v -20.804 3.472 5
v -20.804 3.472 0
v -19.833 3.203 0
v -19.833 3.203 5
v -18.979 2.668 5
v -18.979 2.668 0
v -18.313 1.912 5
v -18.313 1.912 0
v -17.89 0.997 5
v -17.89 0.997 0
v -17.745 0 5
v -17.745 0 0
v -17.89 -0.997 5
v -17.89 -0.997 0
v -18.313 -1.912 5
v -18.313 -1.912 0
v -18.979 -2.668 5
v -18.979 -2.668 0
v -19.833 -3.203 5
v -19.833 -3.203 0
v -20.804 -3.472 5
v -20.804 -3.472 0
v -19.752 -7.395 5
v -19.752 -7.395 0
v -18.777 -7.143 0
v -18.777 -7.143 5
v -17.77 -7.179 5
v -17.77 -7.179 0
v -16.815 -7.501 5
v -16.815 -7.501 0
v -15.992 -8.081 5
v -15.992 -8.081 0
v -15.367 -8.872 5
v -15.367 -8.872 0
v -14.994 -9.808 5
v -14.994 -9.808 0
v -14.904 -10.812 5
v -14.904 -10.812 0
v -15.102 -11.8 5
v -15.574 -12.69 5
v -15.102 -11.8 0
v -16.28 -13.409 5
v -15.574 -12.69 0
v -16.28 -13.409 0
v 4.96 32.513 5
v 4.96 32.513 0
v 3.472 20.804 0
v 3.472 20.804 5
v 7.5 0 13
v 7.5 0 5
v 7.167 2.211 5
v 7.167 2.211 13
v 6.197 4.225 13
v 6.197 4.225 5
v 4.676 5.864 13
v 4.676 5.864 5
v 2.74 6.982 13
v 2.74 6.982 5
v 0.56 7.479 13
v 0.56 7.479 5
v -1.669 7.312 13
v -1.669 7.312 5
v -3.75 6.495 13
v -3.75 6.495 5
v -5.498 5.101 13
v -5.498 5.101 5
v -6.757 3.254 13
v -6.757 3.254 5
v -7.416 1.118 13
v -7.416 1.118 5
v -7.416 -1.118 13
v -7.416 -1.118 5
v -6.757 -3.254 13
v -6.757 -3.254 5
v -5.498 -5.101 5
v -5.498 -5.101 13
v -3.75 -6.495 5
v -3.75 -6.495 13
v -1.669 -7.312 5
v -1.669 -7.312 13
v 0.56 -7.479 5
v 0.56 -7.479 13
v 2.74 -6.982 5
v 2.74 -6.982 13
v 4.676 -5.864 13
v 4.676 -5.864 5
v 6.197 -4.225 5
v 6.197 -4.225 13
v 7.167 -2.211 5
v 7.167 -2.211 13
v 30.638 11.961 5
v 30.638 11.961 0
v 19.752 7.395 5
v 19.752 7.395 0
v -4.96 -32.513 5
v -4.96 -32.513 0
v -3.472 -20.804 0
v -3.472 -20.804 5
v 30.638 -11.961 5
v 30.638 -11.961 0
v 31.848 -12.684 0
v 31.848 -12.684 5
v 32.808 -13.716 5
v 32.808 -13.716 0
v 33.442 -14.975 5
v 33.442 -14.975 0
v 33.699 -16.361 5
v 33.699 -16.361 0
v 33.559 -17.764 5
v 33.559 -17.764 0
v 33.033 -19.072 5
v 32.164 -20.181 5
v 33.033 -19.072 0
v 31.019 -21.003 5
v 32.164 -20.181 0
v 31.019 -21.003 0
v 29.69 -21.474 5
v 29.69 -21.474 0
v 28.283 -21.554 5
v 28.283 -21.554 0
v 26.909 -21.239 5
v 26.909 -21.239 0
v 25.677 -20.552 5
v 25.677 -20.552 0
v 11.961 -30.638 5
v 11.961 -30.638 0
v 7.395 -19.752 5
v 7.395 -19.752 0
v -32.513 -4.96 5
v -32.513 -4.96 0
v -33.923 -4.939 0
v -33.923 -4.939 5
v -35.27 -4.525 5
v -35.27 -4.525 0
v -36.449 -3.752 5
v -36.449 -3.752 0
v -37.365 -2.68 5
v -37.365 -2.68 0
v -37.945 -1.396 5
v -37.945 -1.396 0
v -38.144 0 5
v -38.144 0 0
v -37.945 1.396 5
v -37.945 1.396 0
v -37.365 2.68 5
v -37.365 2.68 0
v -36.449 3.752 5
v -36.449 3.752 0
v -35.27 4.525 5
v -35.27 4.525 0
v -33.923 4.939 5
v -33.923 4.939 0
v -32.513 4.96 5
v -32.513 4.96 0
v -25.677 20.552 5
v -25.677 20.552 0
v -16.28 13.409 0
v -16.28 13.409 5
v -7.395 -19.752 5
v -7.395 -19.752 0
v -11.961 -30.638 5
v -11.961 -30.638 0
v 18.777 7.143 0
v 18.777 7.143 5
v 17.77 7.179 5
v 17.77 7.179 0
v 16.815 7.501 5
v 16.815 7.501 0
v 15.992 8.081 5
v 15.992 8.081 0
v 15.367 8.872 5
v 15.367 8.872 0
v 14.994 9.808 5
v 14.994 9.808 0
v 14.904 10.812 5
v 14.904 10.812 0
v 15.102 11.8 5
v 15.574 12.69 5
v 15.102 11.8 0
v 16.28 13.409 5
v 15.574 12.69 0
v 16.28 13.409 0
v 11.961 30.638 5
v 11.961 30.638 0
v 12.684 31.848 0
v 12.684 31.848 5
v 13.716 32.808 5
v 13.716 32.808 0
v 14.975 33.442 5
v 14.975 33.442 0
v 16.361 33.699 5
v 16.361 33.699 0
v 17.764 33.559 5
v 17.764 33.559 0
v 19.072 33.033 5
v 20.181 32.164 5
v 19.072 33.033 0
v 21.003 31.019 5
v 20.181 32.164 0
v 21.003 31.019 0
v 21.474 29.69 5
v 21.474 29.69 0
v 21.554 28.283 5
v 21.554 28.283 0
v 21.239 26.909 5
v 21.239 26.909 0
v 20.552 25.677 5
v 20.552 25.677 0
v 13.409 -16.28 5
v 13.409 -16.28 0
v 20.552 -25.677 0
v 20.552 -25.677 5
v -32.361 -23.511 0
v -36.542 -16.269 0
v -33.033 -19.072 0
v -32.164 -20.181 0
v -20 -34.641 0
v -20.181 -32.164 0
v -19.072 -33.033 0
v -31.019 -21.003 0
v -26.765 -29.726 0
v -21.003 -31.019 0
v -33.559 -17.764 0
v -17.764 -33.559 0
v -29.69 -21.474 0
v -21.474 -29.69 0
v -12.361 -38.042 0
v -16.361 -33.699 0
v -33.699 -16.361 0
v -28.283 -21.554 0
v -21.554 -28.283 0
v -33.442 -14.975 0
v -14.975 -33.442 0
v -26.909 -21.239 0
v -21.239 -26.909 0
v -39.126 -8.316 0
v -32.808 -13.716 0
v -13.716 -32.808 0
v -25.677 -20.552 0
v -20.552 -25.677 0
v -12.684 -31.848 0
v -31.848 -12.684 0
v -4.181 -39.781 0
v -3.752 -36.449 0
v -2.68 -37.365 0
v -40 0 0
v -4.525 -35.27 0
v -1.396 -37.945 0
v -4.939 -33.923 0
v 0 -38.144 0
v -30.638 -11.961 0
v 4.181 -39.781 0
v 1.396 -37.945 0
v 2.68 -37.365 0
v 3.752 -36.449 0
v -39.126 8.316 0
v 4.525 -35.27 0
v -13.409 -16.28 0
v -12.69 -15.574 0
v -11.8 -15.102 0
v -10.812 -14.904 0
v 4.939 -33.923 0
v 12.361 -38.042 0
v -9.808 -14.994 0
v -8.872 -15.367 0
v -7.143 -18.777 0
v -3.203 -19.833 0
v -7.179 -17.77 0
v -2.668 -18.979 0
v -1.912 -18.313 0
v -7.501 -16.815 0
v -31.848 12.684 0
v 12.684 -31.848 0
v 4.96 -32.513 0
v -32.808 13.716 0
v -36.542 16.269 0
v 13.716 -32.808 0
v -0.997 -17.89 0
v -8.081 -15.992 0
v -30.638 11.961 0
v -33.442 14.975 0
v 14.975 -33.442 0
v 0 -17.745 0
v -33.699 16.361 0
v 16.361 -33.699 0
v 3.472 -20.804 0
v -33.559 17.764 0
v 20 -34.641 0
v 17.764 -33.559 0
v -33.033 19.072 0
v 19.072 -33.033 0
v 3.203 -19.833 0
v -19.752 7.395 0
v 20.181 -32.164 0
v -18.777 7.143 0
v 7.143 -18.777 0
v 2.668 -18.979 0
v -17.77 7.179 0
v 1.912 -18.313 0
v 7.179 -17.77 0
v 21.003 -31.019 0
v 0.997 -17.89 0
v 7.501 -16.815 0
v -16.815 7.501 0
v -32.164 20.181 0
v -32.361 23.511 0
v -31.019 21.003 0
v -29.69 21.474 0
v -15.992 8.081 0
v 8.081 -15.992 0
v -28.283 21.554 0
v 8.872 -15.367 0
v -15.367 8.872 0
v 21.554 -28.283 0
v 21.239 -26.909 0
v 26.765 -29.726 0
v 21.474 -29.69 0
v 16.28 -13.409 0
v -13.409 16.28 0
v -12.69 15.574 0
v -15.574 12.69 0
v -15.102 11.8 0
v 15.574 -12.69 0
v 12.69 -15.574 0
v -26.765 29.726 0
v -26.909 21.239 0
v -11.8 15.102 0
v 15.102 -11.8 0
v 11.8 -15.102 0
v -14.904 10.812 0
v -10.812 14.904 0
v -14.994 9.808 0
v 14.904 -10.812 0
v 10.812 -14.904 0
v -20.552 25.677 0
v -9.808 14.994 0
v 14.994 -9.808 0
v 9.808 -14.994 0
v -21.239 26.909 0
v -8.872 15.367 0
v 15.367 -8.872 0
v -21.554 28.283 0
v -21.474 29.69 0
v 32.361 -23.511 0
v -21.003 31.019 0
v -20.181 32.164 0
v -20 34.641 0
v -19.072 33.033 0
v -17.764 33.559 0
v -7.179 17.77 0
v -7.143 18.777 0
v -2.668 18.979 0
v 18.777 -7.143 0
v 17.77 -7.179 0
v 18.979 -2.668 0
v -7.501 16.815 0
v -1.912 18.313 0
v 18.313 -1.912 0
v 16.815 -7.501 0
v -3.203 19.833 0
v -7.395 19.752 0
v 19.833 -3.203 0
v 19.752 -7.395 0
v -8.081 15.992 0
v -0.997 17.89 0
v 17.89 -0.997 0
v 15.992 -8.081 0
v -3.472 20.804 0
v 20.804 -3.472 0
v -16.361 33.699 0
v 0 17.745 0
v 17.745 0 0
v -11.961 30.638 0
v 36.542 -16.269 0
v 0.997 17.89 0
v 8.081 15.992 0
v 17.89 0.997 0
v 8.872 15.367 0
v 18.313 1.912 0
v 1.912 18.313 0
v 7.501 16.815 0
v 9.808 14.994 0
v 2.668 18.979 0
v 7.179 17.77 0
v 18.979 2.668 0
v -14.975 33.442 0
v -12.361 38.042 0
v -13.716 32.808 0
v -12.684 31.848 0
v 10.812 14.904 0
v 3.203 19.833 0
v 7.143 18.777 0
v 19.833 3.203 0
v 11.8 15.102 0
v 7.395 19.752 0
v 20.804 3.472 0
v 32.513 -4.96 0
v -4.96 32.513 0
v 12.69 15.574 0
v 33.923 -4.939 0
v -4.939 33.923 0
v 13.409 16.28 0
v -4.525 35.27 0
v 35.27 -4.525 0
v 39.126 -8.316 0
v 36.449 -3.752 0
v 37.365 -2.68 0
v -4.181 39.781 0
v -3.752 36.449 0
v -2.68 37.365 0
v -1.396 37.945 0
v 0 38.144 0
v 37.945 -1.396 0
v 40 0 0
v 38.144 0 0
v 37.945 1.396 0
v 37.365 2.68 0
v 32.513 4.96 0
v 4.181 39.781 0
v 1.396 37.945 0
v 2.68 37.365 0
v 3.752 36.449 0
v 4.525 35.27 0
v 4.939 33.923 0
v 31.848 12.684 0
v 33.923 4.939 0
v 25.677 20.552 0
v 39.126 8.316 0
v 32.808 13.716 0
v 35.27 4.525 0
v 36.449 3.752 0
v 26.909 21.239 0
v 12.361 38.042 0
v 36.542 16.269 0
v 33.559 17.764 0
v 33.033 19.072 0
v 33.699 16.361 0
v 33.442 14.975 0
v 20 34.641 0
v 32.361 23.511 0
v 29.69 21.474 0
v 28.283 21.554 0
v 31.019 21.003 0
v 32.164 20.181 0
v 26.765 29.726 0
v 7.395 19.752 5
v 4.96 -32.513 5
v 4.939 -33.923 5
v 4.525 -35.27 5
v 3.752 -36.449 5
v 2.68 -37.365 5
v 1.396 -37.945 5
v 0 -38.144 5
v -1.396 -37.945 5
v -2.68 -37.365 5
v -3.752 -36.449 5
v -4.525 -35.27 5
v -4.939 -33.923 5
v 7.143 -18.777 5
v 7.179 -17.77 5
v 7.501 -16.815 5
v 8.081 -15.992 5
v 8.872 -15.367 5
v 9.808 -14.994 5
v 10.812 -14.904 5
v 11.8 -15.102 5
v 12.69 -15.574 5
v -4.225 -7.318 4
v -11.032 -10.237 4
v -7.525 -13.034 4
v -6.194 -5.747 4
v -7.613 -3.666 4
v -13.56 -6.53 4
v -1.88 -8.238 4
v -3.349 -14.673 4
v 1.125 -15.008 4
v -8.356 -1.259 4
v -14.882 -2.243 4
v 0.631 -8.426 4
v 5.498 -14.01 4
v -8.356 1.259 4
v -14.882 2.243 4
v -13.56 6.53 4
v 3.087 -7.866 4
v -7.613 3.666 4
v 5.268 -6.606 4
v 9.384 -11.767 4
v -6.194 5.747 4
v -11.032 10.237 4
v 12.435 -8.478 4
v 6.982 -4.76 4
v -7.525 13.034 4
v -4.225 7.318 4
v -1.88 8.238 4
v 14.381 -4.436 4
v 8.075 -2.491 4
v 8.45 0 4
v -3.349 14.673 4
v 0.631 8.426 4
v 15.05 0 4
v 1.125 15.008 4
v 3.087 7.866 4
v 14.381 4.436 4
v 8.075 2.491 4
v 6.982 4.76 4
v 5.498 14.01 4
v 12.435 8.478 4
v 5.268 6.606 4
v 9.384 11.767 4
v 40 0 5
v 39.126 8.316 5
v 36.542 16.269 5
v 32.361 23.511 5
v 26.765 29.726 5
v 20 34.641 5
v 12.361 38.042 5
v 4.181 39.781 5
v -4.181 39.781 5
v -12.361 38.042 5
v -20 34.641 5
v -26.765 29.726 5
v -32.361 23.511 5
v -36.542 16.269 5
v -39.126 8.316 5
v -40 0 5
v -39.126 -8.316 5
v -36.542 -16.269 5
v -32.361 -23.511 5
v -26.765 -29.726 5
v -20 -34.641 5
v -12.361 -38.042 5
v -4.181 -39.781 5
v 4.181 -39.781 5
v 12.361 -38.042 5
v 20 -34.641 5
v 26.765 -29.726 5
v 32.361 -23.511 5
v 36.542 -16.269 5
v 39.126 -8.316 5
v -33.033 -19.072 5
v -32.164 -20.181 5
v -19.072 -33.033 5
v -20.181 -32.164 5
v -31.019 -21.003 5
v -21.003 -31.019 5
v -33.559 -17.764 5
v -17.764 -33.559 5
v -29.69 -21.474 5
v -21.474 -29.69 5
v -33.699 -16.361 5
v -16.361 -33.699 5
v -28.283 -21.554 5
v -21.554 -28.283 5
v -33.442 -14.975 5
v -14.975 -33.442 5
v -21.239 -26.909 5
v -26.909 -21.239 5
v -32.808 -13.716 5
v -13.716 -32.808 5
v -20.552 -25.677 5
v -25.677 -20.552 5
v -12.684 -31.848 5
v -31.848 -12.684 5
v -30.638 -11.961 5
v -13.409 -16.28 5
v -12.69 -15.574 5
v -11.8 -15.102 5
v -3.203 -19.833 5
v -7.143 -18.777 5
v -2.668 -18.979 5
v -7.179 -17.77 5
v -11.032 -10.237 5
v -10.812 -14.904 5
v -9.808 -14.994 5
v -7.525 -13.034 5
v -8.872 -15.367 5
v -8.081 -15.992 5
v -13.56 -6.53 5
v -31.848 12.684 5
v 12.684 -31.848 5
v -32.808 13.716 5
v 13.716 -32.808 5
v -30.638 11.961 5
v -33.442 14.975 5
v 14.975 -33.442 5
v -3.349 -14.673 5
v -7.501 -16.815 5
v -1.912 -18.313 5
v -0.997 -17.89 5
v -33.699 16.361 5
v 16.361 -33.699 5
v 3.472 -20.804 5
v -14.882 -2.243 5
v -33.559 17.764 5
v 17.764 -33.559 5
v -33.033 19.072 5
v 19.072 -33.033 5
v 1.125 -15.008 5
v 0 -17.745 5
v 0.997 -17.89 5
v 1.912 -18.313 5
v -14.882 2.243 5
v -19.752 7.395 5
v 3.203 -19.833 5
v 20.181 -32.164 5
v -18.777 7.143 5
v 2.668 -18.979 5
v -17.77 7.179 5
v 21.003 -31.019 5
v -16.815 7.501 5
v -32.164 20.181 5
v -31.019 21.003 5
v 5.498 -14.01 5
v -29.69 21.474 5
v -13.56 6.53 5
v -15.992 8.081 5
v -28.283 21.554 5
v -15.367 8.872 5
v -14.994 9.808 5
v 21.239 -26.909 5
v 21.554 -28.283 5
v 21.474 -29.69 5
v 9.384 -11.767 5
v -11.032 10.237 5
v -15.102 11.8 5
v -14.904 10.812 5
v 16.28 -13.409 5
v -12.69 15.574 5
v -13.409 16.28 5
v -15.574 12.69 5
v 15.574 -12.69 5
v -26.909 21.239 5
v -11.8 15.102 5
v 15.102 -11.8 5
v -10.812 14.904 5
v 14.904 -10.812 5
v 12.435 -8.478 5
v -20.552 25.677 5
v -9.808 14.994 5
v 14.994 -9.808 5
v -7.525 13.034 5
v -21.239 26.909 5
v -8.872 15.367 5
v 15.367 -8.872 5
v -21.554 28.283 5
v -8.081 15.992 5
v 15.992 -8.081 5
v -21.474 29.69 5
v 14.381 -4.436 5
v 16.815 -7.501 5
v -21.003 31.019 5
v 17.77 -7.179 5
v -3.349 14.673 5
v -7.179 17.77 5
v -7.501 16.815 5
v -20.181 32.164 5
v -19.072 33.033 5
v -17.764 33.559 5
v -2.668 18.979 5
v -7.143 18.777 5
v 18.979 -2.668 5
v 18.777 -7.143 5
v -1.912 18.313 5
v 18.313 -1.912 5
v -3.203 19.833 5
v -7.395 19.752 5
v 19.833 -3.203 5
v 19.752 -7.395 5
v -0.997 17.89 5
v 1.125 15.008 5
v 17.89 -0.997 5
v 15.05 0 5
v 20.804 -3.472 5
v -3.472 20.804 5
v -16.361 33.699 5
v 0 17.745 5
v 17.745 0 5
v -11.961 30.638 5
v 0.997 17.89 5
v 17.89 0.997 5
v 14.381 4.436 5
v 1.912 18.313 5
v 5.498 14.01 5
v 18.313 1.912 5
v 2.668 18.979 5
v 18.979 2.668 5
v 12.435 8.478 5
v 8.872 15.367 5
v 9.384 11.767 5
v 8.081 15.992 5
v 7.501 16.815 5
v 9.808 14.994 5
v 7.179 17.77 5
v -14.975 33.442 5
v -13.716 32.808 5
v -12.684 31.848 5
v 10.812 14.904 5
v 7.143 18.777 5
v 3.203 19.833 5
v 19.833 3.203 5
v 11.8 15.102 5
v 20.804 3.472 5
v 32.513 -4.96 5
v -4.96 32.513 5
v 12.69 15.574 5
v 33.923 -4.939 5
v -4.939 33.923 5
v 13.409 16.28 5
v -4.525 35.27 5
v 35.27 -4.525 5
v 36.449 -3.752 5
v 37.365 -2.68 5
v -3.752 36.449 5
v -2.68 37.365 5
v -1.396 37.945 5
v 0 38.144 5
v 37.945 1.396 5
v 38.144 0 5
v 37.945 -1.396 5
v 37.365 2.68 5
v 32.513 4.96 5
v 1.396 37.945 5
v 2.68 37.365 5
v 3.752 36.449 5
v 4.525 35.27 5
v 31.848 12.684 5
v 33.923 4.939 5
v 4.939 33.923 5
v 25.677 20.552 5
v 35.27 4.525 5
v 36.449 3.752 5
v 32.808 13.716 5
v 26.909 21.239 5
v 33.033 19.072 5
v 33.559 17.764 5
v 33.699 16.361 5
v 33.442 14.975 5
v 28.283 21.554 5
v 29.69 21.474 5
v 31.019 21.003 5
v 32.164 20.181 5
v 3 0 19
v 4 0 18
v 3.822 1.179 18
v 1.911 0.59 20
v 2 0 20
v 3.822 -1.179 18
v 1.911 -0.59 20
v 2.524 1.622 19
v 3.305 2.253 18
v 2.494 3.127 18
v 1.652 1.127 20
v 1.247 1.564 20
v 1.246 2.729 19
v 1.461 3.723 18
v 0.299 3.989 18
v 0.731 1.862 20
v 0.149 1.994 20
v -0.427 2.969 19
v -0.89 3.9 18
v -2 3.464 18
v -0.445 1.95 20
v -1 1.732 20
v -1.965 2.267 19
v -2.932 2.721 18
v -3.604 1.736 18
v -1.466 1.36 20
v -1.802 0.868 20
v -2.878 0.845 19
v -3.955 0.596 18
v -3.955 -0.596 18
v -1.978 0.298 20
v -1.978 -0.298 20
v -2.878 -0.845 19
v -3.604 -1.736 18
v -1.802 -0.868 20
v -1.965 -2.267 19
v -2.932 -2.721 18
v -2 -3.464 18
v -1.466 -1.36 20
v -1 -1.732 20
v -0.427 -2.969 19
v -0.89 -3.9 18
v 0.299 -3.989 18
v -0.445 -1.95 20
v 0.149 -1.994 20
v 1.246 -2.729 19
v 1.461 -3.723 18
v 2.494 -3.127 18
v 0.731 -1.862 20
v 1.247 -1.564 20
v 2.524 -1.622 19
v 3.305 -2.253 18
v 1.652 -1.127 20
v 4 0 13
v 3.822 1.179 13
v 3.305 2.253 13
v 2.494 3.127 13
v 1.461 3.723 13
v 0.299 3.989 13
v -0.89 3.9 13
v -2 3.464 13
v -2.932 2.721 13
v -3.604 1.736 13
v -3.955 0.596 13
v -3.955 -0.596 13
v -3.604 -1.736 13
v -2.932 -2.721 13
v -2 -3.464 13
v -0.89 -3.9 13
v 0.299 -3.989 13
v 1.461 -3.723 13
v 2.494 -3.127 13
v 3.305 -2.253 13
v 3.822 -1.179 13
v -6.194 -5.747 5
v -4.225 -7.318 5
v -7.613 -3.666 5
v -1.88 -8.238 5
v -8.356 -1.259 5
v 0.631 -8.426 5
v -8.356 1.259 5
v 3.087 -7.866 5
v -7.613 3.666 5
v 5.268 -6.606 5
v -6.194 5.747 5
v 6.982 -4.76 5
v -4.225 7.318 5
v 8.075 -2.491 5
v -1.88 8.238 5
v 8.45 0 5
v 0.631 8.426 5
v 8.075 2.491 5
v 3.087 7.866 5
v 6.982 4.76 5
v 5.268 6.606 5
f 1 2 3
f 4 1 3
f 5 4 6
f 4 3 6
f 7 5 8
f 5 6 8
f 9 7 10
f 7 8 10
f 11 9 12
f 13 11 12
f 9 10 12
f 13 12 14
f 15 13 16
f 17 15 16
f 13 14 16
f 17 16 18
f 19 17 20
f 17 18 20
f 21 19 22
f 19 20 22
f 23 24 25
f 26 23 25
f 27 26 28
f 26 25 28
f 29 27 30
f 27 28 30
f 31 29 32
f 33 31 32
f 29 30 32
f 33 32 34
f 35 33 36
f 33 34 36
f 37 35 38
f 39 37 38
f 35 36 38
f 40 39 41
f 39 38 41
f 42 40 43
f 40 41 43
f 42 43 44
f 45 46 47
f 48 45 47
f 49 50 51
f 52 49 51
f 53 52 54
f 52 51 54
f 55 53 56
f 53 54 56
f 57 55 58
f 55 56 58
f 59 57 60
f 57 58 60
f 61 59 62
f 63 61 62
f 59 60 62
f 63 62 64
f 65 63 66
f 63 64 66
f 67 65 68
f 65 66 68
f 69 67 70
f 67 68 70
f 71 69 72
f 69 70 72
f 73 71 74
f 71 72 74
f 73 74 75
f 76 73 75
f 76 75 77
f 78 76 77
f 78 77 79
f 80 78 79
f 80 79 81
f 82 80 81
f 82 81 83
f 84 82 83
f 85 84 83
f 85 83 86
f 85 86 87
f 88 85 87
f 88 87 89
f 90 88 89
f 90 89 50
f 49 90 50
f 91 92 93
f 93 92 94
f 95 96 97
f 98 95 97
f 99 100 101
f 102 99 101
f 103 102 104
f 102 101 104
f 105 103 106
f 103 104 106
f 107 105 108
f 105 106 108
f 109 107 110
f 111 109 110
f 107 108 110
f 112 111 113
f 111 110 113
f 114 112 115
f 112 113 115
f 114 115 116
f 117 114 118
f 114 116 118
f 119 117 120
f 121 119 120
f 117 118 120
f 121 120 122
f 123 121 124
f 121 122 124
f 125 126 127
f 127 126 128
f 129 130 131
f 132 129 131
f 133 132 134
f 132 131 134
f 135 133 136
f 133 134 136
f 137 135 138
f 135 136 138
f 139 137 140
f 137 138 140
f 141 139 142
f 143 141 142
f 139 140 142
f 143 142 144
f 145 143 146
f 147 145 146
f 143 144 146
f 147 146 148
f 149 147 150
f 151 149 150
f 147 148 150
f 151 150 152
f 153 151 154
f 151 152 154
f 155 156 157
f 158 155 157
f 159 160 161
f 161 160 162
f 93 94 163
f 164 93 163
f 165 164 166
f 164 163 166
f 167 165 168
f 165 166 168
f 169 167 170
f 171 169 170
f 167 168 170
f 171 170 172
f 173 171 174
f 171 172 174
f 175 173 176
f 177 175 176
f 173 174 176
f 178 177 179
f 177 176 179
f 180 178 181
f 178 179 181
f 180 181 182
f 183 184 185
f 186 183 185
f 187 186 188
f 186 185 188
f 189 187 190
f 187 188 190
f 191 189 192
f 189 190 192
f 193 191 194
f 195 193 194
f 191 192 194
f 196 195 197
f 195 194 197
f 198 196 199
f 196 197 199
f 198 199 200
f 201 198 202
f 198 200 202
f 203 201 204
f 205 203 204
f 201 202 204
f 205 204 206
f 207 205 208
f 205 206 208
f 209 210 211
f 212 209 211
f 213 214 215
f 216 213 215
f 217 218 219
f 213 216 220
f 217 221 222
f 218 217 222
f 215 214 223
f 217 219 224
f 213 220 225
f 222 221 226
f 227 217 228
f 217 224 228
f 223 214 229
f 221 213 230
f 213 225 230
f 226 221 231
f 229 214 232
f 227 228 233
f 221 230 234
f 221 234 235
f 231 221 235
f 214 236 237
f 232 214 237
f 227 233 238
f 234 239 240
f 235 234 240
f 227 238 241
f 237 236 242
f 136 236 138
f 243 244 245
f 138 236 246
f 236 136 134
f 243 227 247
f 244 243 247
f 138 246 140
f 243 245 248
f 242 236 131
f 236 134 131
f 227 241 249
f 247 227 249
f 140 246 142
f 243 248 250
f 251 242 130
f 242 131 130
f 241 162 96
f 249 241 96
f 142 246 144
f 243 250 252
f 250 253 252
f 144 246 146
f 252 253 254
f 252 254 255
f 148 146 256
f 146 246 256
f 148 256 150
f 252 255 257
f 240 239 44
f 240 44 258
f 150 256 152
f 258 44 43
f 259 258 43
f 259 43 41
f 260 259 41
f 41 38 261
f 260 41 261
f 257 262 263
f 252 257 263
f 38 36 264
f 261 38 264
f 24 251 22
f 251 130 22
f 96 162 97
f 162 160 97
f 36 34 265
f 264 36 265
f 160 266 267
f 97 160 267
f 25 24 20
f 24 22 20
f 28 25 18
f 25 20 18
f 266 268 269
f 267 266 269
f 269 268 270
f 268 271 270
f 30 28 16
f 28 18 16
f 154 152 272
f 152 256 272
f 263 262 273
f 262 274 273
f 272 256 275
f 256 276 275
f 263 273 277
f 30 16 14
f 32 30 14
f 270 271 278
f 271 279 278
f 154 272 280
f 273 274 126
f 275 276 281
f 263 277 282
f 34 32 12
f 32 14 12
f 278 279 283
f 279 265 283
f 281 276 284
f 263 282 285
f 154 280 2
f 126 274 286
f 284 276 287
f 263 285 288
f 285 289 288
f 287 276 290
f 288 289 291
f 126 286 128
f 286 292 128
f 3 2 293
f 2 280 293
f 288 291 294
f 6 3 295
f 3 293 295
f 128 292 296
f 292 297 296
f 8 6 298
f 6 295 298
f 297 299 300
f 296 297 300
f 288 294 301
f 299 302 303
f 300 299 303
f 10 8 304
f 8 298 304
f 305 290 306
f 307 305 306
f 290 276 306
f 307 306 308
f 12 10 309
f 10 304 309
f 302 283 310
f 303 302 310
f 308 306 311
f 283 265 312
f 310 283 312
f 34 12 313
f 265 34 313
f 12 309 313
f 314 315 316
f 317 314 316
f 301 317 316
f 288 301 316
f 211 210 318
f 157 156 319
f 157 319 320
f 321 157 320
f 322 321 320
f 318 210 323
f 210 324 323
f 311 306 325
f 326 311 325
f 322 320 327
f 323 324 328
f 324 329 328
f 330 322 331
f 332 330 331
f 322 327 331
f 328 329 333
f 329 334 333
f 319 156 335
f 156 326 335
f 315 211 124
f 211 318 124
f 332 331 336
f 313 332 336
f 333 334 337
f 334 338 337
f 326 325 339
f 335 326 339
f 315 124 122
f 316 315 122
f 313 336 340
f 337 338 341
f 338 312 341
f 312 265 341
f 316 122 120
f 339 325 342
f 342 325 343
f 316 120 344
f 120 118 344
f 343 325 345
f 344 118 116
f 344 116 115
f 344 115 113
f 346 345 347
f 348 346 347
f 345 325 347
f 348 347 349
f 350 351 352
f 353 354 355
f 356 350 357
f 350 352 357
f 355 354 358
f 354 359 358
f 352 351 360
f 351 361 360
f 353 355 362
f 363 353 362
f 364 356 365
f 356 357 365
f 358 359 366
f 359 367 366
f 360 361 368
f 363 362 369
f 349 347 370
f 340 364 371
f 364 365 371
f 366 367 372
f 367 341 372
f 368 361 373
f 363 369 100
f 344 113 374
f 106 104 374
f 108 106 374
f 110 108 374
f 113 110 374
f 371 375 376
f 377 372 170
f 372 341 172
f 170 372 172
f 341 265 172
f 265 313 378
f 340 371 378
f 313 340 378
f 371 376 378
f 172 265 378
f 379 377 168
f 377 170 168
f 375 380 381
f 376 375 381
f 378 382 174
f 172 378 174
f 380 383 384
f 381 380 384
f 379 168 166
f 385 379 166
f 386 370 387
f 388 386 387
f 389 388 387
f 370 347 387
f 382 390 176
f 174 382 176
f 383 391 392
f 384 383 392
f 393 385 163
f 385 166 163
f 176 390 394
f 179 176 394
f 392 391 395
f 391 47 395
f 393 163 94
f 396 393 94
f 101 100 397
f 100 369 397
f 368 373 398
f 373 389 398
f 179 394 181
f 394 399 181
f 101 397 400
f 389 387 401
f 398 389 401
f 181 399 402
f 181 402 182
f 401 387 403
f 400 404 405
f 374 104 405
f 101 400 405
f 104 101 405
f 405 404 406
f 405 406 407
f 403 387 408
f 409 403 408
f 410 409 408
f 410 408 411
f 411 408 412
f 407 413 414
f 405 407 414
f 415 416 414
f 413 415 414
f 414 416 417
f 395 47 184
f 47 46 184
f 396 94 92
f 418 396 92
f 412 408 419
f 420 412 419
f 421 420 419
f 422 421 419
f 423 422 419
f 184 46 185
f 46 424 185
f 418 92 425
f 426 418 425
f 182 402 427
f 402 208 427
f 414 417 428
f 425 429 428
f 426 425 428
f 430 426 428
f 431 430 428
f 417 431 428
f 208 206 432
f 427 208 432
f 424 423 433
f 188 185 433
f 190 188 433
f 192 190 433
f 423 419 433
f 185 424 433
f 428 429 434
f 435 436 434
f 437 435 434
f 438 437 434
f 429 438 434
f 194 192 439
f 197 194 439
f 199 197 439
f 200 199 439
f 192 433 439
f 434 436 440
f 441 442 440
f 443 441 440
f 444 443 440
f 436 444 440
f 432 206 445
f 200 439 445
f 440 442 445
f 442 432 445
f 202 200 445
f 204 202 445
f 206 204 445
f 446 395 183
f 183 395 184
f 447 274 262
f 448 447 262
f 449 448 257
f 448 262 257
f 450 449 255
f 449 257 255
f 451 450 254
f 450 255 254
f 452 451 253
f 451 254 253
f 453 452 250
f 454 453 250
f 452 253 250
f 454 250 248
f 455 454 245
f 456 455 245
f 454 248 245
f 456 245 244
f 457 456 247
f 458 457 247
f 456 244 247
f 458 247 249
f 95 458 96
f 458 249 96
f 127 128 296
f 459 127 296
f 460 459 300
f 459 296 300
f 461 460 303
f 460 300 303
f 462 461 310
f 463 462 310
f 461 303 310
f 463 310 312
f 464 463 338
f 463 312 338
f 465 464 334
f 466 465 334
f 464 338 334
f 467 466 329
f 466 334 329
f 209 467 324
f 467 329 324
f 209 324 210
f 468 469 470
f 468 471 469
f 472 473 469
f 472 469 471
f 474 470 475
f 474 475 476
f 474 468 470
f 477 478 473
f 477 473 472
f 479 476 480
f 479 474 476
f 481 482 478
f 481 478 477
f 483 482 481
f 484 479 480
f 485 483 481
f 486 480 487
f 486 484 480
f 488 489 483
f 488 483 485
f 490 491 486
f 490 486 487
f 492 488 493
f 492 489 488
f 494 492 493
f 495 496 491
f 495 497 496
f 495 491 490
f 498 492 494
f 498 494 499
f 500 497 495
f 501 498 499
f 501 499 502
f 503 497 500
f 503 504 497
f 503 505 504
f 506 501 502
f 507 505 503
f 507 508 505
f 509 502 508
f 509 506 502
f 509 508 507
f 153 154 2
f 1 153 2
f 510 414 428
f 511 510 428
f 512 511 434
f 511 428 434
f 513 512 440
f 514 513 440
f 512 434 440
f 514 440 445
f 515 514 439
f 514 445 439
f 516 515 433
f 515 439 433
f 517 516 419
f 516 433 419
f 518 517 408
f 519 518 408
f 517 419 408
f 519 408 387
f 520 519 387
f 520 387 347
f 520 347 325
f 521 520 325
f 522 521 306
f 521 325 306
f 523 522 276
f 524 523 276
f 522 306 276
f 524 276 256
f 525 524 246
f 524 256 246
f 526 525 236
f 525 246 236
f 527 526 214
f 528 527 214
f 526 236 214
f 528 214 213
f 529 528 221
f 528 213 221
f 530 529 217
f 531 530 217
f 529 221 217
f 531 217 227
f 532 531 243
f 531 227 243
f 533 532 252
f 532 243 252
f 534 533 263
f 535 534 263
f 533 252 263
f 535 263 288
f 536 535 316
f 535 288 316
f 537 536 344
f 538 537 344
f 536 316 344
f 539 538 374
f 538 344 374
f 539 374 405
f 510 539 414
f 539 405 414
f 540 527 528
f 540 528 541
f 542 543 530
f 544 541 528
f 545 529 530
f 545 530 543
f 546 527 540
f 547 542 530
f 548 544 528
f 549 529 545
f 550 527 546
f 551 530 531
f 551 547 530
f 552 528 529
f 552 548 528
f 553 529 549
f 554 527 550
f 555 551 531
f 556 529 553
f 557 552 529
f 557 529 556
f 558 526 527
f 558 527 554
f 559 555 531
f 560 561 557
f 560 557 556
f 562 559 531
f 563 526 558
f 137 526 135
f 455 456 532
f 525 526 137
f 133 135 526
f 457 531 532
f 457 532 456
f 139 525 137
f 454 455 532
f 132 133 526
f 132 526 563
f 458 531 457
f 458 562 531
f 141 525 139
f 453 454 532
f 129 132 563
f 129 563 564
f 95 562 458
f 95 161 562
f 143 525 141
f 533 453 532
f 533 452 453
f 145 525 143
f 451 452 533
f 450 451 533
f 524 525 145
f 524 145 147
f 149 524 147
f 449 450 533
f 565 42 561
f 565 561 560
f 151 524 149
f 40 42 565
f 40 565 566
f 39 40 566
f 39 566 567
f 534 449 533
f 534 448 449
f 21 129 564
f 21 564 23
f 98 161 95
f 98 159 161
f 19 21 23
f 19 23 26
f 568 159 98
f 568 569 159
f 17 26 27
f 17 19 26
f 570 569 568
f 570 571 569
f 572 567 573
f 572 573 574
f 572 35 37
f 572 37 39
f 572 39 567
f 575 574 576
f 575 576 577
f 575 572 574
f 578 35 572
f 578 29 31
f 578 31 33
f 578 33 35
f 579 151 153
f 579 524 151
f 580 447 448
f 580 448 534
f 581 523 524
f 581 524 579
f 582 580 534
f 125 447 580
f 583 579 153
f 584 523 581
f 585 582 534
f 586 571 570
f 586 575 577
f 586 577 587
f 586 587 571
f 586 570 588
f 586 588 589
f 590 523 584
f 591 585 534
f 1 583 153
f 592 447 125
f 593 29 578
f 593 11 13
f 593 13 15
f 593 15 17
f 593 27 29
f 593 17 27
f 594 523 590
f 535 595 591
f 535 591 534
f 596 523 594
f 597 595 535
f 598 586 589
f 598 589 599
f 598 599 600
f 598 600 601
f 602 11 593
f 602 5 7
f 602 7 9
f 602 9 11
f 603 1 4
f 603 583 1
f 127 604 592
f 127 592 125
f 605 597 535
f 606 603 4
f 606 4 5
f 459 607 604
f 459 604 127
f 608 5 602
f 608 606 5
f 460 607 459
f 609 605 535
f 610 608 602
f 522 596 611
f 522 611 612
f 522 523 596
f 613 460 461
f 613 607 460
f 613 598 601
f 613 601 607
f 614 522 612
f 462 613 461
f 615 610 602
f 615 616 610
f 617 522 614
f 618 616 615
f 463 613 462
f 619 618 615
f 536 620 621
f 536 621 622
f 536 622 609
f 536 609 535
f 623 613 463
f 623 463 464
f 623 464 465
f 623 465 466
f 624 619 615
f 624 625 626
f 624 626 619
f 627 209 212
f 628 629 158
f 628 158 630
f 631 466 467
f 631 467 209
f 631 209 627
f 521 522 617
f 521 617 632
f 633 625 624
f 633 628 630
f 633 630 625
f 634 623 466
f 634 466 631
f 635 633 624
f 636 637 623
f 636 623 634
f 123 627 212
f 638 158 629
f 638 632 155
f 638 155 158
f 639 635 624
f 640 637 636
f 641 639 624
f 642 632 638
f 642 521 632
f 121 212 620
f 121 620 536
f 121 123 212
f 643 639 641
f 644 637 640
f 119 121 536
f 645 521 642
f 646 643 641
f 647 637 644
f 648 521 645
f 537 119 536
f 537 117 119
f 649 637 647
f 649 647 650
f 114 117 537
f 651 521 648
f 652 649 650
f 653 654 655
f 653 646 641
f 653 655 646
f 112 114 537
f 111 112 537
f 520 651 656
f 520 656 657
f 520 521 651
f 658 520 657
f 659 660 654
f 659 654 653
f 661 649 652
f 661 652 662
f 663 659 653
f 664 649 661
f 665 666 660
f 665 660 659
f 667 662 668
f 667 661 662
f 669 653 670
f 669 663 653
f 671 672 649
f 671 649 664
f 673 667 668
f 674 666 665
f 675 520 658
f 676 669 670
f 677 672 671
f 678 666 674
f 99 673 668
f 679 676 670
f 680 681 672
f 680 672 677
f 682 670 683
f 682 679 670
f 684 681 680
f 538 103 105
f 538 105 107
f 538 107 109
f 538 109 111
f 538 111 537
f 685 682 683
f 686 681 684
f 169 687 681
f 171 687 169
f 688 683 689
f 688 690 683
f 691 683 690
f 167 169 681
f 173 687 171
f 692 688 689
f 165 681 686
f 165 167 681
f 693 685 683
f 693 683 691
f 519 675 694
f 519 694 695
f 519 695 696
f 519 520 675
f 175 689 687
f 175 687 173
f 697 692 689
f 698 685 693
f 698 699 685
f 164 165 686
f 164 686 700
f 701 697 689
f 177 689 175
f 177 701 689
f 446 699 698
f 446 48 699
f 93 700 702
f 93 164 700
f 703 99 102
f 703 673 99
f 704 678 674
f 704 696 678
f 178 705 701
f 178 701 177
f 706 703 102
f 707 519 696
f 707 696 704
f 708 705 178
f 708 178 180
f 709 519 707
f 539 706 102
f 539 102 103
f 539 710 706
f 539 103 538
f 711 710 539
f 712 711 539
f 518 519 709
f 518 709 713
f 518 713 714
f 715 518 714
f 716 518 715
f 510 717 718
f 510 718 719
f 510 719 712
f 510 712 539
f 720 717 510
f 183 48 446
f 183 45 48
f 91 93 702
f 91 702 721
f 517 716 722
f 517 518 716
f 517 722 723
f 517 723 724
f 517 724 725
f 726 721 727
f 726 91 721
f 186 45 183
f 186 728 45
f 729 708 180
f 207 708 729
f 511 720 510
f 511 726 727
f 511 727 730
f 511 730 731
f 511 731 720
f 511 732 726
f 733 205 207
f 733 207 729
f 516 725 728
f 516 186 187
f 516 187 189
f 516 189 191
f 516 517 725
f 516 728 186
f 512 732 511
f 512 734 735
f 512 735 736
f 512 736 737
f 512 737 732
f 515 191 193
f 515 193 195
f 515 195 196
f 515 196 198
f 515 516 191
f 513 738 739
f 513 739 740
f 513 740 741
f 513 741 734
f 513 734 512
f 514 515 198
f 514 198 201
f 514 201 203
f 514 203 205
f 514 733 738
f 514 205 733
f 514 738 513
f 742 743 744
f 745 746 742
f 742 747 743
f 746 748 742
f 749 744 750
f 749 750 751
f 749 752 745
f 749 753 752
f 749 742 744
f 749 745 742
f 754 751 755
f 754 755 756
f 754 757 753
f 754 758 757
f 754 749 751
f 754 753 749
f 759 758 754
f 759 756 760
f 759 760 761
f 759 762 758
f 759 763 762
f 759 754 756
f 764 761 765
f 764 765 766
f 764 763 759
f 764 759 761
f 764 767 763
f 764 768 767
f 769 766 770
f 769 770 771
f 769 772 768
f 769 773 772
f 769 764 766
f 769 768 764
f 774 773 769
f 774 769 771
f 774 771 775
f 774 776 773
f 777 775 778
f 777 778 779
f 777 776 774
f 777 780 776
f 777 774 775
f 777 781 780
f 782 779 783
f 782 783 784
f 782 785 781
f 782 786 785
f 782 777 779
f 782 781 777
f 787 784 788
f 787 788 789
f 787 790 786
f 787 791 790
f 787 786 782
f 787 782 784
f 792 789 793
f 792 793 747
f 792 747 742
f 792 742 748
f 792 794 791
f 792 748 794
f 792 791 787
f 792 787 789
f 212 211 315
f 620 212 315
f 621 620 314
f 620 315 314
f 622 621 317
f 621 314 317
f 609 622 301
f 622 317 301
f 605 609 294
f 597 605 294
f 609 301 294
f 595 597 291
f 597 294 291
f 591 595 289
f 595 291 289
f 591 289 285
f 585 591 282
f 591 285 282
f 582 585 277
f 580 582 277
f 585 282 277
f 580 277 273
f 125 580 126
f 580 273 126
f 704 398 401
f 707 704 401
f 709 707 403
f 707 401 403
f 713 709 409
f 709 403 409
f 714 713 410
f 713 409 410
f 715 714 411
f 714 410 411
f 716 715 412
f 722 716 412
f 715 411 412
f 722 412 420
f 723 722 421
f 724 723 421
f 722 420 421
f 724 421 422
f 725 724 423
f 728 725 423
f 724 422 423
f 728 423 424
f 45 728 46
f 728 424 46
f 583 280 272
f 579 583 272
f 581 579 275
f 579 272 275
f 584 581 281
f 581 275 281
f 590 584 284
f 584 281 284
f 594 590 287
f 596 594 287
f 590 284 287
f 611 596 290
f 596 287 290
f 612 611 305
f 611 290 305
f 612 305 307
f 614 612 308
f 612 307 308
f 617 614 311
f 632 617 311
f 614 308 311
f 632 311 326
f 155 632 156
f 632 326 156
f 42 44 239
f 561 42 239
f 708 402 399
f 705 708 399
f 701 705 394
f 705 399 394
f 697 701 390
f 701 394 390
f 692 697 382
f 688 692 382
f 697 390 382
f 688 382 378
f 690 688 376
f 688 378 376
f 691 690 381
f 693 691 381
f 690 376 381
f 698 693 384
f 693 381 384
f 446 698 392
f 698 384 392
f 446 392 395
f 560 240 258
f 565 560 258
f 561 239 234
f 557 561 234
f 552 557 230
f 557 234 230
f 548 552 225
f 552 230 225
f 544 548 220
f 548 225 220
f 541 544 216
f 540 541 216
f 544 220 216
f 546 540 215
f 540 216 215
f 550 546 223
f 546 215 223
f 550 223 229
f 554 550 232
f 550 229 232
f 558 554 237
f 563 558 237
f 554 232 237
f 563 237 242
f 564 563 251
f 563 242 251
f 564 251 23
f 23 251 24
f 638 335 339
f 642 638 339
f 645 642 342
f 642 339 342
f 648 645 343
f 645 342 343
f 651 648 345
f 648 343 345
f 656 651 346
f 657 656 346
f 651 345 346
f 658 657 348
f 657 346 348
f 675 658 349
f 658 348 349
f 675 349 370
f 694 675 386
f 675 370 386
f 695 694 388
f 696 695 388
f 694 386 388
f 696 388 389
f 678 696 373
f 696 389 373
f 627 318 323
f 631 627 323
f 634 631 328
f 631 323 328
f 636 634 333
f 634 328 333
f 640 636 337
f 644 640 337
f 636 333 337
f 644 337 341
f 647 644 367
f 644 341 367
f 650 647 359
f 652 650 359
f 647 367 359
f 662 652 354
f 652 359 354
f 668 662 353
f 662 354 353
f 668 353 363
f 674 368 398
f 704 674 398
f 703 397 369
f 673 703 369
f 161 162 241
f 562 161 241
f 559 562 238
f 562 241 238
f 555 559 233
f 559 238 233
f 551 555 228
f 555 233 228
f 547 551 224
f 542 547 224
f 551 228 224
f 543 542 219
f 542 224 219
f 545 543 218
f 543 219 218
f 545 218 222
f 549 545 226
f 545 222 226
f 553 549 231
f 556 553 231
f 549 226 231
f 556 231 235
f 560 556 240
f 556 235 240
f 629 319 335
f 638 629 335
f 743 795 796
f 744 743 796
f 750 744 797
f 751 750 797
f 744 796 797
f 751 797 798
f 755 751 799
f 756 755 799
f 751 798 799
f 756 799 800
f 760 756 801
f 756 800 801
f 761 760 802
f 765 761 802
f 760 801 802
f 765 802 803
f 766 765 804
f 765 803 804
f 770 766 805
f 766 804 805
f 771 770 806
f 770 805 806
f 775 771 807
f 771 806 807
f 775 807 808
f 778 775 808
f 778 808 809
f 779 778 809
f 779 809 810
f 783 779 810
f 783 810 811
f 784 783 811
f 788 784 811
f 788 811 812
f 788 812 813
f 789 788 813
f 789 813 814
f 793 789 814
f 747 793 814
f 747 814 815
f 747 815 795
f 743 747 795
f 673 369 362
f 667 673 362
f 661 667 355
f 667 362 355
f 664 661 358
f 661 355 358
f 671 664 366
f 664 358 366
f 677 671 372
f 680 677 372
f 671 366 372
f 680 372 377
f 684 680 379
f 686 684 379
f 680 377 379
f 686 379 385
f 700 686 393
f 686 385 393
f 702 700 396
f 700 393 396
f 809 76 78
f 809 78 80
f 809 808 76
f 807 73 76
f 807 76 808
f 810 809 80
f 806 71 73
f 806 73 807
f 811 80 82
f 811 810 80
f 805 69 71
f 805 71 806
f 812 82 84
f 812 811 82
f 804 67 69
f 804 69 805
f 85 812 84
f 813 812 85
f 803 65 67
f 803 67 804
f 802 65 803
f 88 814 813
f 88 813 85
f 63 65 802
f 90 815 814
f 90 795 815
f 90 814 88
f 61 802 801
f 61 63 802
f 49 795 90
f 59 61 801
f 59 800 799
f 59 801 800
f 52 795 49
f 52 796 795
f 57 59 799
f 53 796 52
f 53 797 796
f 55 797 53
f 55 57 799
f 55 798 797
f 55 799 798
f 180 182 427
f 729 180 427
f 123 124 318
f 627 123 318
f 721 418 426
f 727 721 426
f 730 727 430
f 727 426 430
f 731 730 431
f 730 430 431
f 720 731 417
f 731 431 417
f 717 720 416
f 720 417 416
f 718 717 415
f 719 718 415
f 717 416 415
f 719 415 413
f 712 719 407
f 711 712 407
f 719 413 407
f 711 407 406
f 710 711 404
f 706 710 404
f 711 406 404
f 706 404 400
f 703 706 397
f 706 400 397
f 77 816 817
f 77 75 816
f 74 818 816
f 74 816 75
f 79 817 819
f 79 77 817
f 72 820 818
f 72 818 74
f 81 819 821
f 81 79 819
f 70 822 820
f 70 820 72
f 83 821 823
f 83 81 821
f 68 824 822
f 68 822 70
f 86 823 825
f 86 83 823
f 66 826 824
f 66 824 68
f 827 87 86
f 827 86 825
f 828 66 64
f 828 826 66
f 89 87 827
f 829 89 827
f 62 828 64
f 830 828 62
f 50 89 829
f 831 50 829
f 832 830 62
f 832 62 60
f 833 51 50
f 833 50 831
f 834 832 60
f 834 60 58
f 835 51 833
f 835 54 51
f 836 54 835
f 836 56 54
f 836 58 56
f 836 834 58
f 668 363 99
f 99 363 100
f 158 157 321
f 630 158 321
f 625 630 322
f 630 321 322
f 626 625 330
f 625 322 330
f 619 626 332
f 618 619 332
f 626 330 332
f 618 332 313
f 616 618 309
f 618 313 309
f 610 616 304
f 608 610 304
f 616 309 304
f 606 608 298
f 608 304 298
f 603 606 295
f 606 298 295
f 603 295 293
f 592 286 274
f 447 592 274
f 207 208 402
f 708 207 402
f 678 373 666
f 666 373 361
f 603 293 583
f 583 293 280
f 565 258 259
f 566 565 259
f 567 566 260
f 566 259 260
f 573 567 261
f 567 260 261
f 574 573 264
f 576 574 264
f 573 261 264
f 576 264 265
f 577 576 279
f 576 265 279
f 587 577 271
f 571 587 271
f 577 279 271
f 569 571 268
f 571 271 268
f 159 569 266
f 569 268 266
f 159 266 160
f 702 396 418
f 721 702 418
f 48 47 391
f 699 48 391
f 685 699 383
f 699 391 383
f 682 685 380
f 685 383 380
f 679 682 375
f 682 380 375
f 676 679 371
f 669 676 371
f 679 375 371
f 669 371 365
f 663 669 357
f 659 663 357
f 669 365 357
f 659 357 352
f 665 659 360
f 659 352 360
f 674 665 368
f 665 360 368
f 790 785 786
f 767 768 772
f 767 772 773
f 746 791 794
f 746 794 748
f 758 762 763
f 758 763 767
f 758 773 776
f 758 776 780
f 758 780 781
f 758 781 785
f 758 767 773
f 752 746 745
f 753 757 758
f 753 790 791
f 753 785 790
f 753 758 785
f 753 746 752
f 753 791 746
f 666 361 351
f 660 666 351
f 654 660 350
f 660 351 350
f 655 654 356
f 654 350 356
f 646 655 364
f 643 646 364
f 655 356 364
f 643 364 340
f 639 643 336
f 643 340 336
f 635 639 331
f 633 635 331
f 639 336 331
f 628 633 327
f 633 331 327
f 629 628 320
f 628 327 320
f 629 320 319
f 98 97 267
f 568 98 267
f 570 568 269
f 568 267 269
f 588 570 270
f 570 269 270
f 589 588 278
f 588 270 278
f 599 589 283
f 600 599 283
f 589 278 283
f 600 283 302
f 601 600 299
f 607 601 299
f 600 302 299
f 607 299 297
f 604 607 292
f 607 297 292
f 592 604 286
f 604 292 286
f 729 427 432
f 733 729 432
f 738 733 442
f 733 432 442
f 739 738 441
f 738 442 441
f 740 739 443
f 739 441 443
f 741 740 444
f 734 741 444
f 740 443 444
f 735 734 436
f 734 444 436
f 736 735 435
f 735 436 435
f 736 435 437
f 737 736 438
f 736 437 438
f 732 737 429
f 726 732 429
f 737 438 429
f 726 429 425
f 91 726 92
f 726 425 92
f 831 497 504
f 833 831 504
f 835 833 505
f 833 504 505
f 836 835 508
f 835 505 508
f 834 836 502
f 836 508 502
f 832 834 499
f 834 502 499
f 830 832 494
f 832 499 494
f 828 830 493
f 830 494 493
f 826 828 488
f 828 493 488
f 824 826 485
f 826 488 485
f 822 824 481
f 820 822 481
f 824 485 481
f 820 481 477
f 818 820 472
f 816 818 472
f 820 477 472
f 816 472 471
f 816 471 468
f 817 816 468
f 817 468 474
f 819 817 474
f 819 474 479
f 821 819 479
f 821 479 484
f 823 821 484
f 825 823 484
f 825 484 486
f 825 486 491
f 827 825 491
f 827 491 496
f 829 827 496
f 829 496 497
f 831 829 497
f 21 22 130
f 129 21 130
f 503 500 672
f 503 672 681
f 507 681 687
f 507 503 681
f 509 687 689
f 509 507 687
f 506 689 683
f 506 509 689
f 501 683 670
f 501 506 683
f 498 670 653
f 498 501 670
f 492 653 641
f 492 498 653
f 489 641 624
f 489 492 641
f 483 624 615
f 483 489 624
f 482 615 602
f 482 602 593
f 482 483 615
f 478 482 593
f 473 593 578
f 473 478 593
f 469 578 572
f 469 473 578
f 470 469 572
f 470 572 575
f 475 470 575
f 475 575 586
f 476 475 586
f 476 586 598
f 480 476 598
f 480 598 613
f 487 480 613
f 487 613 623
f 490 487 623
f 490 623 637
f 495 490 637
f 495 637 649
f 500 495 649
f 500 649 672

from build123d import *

# Parameters (mm, degrees)
F0_R     = 40
F0_R_2   = 15.05
F1_DEPTH = 5
F0_R_3   = 8.45
F2_DEPTH = 4
F0_R_4   = 7.5
F3_DEPTH = 5
F0_R_5   = 4
F4_DEPTH = 13
F5_DEPTH = 20
F6_SIZE2 = 2
F6_SIZE  = 2


with BuildPart() as f1:
    # F0 (on Top) → F1 (new body)
    with BuildSketch(Plane.XY):
        Circle(F0_R)
        with BuildLine():
            ThreePointArc((-11.9611435045, -30.6375331929), (-19.0718793869, -33.0334640939), (-20.5523103021, -25.6774207297))
            Line((-20.5523103021, -25.6774207297), (-13.4086800794, -16.2803577113))
            ThreePointArc((-13.4086800794, -16.2803577113), (-8.8723784387, -15.3674102398), (-7.394863321, -19.7524364356))
            Line((-7.394863321, -19.7524364356), (-11.9611435045, -30.6375331929))
        make_face(mode=Mode.SUBTRACT)
        with BuildLine():
            ThreePointArc((4.9601124633, -32.5134538066), (0, -38.1437587738), (-4.9601124633, -32.5134538066))
            Line((-4.9601124633, -32.5134538066), (-3.4720787243, -20.8035434004))
            ThreePointArc((-3.4720787243, -20.8035434004), (0, -17.7447568774), (3.4720787243, -20.8035434004))
            Line((3.4720787243, -20.8035434004), (4.9601124633, -32.5134538066))
        make_face(mode=Mode.SUBTRACT)
        with BuildLine():
            ThreePointArc((-25.6774207297, -20.5523103021), (-33.0334640939, -19.0718793869), (-30.6375331929, -11.9611435045))
            Line((-30.6375331929, -11.9611435045), (-19.7524364356, -7.394863321))
            ThreePointArc((-19.7524364356, -7.394863321), (-15.3674102398, -8.8723784387), (-16.2803577113, -13.4086800794))
            Line((-16.2803577113, -13.4086800794), (-25.6774207297, -20.5523103021))
        make_face(mode=Mode.SUBTRACT)
        with BuildLine():
            ThreePointArc((20.5523103021, -25.6774207297), (19.0718793869, -33.0334640939), (11.9611435045, -30.6375331929))
            Line((11.9611435045, -30.6375331929), (7.394863321, -19.7524364356))
            ThreePointArc((7.394863321, -19.7524364356), (8.8723784387, -15.3674102398), (13.4086800794, -16.2803577113))
            Line((13.4086800794, -16.2803577113), (20.5523103021, -25.6774207297))
        make_face(mode=Mode.SUBTRACT)
        with BuildLine():
            ThreePointArc((30.6375331929, -11.9611435045), (33.0334640939, -19.0718793869), (25.6774207297, -20.5523103021))
            Line((25.6774207297, -20.5523103021), (16.2803577113, -13.4086800794))
            ThreePointArc((16.2803577113, -13.4086800794), (15.3674102398, -8.8723784387), (19.7524364356, -7.394863321))
            Line((19.7524364356, -7.394863321), (30.6375331929, -11.9611435045))
        make_face(mode=Mode.SUBTRACT)
        with BuildLine():
            ThreePointArc((32.5134538066, 4.9601124633), (38.1437587738, 0), (32.5134538066, -4.9601124633))
            Line((32.5134538066, -4.9601124633), (20.8035434004, -3.4720787243))
            ThreePointArc((20.8035434004, -3.4720787243), (17.7447568774, 0), (20.8035434004, 3.4720787243))
            Line((20.8035434004, 3.4720787243), (32.5134538066, 4.9601124633))
        make_face(mode=Mode.SUBTRACT)
        with BuildLine():
            ThreePointArc((-32.5134538066, -4.9601124633), (-38.1437587738, 0), (-32.5134538066, 4.9601124633))
            Line((-32.5134538066, 4.9601124633), (-20.8035434004, 3.4720787243))
            ThreePointArc((-20.8035434004, 3.4720787243), (-17.7447568774, 0), (-20.8035434004, -3.4720787243))
            Line((-20.8035434004, -3.4720787243), (-32.5134538066, -4.9601124633))
        make_face(mode=Mode.SUBTRACT)
        with BuildLine():
            ThreePointArc((-30.6375331929, 11.9611435045), (-33.0334640939, 19.0718793869), (-25.6774207297, 20.5523103021))
            Line((-25.6774207297, 20.5523103021), (-16.2803577113, 13.4086800794))
            ThreePointArc((-16.2803577113, 13.4086800794), (-15.3674102398, 8.8723784387), (-19.7524364356, 7.394863321))
            Line((-19.7524364356, 7.394863321), (-30.6375331929, 11.9611435045))
        make_face(mode=Mode.SUBTRACT)
        with BuildLine():
            ThreePointArc((-20.5523103021, 25.6774207297), (-19.0718793869, 33.0334640939), (-11.9611435045, 30.6375331929))
            Line((-11.9611435045, 30.6375331929), (-7.394863321, 19.7524364356))
            ThreePointArc((-7.394863321, 19.7524364356), (-8.8723784387, 15.3674102398), (-13.4086800794, 16.2803577113))
            Line((-13.4086800794, 16.2803577113), (-20.5523103021, 25.6774207297))
        make_face(mode=Mode.SUBTRACT)
        Circle(F0_R_2, mode=Mode.SUBTRACT)
        with BuildLine():
            ThreePointArc((25.6774207297, 20.5523103021), (33.0334640939, 19.0718793869), (30.6375331929, 11.9611435045))
            Line((30.6375331929, 11.9611435045), (19.7524364356, 7.394863321))
            ThreePointArc((19.7524364356, 7.394863321), (15.3674102398, 8.8723784387), (16.2803577113, 13.4086800794))
            Line((16.2803577113, 13.4086800794), (25.6774207297, 20.5523103021))
        make_face(mode=Mode.SUBTRACT)
        with BuildLine():
            ThreePointArc((3.4720787243, 20.8035434004), (0, 17.7447568774), (-3.4720787243, 20.8035434004))
            Line((-3.4720787243, 20.8035434004), (-4.9601124633, 32.5134538066))
            ThreePointArc((-4.9601124633, 32.5134538066), (0, 38.1437587738), (4.9601124633, 32.5134538066))
            Line((4.9601124633, 32.5134538066), (3.4720787243, 20.8035434004))
        make_face(mode=Mode.SUBTRACT)
        with BuildLine():
            ThreePointArc((11.9611435045, 30.6375331929), (19.0718793869, 33.0334640939), (20.5523103021, 25.6774207297))
            Line((20.5523103021, 25.6774207297), (13.4086800794, 16.2803577113))
            ThreePointArc((13.4086800794, 16.2803577113), (8.8723784387, 15.3674102398), (7.394863321, 19.7524364356))
            Line((7.394863321, 19.7524364356), (11.9611435045, 30.6375331929))
        make_face(mode=Mode.SUBTRACT)
    extrude(amount=F1_DEPTH)

    # F0 (on Top) → F2 (join)
    with BuildSketch(Plane.XY):
        Circle(F0_R_2)
        Circle(F0_R_3, mode=Mode.SUBTRACT)
    extrude(amount=F2_DEPTH)

    # F0 (on Top) → F3 (join)
    with BuildSketch(Plane.XY):
        Circle(F0_R_3)
        Circle(F0_R_4, mode=Mode.SUBTRACT)
    extrude(amount=F3_DEPTH)

    # F0 (on Top) → F4 (join)
    with BuildSketch(Plane.XY):
        Circle(F0_R_4)
        Circle(F0_R_5, mode=Mode.SUBTRACT)
    extrude(amount=F4_DEPTH)

    # F0 (on Top) → F5 (join)
    with BuildSketch(Plane.XY):
        Circle(F0_R_5)
    extrude(amount=F5_DEPTH)

    # F6
    f6_edges = [f1.edges().sort_by_distance(p)[0] for p in [
        (-4, 0, 20),
    ]]
    chamfer(f6_edges, length=F6_SIZE, length2=F6_SIZE2)


solid = f1.part
